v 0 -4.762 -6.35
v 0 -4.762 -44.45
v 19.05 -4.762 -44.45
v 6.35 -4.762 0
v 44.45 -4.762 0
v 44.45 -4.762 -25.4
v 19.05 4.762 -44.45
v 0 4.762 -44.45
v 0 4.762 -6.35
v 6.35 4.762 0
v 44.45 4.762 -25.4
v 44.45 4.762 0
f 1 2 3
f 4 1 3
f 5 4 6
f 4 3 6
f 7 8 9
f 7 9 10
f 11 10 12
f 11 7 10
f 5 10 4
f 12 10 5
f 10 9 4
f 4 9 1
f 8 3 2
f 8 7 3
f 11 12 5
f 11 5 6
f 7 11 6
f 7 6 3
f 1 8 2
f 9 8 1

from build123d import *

# Parameters (mm, degrees)
BASE_EXTRUDE_DEPTH = 4.7625
CHAMFER1_SIZE      = 6.35


with BuildPart() as part:
    # Sketch1 → Base-Extrude (new body, symmetric)
    with BuildSketch(Plane(origin=(0, 0, 0), x_dir=(1, 0, 0), z_dir=(0, 1, 0))):
        Polygon((0, 0), (44.45, 0), (44.45, 25.4), (19.05, 44.45), (0, 44.45), align=None)
    extrude(amount=BASE_EXTRUDE_DEPTH, both=True)

    # Chamfer1
    chamfer1_edges = [part.edges().sort_by_distance(p)[0] for p in [
        (0, 0, 0),
    ]]
    chamfer(chamfer1_edges, length=CHAMFER1_SIZE)


solid = part.part
